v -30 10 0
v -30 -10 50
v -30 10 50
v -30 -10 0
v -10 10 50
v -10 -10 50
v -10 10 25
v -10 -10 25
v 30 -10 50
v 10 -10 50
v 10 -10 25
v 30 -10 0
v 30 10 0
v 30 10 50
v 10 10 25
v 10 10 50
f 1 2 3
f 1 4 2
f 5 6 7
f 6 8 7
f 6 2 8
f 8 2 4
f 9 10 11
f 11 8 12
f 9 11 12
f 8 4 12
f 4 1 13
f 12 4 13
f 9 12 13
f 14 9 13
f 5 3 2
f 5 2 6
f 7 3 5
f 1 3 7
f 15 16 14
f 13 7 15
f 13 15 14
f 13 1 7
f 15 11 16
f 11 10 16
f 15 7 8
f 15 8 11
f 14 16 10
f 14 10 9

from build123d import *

# Parameters (mm, degrees)
CROQUIS1_W              = 60
CROQUIS1_H              = 20
SALIENTE_EXTRUIR1_DEPTH = 30
CROQUIS2_W              = 20
CROQUIS2_H              = 20
CORTAR_EXTRUIR1_DEPTH   = 5
CROQUIS4_W              = 20
CROQUIS4_H              = 20
SALIENTE_EXTRUIR2_DEPTH = 20


with BuildPart() as part:
    # Croquis1 → Saliente-Extruir1 (new body)
    with BuildSketch(Plane.XY):
        Rectangle(CROQUIS1_W, CROQUIS1_H)
    extrude(amount=SALIENTE_EXTRUIR1_DEPTH)

    # Croquis2 → Cortar-Extruir1 (cut)
    with BuildSketch(Plane.XY.offset(30)):
        Rectangle(CROQUIS2_W, CROQUIS2_H)
    extrude(amount=-CORTAR_EXTRUIR1_DEPTH, mode=Mode.SUBTRACT)

    # Croquis4 → Saliente-Extruir2 (add)
    with BuildSketch(Plane.XY.offset(30)):
        with Locations((-20, 0)):
            Rectangle(CROQUIS4_W, CROQUIS4_H)
        with Locations((20, 0)):
            Rectangle(CROQUIS4_W, CROQUIS4_H)
    extrude(amount=SALIENTE_EXTRUIR2_DEPTH)


solid = part.part
